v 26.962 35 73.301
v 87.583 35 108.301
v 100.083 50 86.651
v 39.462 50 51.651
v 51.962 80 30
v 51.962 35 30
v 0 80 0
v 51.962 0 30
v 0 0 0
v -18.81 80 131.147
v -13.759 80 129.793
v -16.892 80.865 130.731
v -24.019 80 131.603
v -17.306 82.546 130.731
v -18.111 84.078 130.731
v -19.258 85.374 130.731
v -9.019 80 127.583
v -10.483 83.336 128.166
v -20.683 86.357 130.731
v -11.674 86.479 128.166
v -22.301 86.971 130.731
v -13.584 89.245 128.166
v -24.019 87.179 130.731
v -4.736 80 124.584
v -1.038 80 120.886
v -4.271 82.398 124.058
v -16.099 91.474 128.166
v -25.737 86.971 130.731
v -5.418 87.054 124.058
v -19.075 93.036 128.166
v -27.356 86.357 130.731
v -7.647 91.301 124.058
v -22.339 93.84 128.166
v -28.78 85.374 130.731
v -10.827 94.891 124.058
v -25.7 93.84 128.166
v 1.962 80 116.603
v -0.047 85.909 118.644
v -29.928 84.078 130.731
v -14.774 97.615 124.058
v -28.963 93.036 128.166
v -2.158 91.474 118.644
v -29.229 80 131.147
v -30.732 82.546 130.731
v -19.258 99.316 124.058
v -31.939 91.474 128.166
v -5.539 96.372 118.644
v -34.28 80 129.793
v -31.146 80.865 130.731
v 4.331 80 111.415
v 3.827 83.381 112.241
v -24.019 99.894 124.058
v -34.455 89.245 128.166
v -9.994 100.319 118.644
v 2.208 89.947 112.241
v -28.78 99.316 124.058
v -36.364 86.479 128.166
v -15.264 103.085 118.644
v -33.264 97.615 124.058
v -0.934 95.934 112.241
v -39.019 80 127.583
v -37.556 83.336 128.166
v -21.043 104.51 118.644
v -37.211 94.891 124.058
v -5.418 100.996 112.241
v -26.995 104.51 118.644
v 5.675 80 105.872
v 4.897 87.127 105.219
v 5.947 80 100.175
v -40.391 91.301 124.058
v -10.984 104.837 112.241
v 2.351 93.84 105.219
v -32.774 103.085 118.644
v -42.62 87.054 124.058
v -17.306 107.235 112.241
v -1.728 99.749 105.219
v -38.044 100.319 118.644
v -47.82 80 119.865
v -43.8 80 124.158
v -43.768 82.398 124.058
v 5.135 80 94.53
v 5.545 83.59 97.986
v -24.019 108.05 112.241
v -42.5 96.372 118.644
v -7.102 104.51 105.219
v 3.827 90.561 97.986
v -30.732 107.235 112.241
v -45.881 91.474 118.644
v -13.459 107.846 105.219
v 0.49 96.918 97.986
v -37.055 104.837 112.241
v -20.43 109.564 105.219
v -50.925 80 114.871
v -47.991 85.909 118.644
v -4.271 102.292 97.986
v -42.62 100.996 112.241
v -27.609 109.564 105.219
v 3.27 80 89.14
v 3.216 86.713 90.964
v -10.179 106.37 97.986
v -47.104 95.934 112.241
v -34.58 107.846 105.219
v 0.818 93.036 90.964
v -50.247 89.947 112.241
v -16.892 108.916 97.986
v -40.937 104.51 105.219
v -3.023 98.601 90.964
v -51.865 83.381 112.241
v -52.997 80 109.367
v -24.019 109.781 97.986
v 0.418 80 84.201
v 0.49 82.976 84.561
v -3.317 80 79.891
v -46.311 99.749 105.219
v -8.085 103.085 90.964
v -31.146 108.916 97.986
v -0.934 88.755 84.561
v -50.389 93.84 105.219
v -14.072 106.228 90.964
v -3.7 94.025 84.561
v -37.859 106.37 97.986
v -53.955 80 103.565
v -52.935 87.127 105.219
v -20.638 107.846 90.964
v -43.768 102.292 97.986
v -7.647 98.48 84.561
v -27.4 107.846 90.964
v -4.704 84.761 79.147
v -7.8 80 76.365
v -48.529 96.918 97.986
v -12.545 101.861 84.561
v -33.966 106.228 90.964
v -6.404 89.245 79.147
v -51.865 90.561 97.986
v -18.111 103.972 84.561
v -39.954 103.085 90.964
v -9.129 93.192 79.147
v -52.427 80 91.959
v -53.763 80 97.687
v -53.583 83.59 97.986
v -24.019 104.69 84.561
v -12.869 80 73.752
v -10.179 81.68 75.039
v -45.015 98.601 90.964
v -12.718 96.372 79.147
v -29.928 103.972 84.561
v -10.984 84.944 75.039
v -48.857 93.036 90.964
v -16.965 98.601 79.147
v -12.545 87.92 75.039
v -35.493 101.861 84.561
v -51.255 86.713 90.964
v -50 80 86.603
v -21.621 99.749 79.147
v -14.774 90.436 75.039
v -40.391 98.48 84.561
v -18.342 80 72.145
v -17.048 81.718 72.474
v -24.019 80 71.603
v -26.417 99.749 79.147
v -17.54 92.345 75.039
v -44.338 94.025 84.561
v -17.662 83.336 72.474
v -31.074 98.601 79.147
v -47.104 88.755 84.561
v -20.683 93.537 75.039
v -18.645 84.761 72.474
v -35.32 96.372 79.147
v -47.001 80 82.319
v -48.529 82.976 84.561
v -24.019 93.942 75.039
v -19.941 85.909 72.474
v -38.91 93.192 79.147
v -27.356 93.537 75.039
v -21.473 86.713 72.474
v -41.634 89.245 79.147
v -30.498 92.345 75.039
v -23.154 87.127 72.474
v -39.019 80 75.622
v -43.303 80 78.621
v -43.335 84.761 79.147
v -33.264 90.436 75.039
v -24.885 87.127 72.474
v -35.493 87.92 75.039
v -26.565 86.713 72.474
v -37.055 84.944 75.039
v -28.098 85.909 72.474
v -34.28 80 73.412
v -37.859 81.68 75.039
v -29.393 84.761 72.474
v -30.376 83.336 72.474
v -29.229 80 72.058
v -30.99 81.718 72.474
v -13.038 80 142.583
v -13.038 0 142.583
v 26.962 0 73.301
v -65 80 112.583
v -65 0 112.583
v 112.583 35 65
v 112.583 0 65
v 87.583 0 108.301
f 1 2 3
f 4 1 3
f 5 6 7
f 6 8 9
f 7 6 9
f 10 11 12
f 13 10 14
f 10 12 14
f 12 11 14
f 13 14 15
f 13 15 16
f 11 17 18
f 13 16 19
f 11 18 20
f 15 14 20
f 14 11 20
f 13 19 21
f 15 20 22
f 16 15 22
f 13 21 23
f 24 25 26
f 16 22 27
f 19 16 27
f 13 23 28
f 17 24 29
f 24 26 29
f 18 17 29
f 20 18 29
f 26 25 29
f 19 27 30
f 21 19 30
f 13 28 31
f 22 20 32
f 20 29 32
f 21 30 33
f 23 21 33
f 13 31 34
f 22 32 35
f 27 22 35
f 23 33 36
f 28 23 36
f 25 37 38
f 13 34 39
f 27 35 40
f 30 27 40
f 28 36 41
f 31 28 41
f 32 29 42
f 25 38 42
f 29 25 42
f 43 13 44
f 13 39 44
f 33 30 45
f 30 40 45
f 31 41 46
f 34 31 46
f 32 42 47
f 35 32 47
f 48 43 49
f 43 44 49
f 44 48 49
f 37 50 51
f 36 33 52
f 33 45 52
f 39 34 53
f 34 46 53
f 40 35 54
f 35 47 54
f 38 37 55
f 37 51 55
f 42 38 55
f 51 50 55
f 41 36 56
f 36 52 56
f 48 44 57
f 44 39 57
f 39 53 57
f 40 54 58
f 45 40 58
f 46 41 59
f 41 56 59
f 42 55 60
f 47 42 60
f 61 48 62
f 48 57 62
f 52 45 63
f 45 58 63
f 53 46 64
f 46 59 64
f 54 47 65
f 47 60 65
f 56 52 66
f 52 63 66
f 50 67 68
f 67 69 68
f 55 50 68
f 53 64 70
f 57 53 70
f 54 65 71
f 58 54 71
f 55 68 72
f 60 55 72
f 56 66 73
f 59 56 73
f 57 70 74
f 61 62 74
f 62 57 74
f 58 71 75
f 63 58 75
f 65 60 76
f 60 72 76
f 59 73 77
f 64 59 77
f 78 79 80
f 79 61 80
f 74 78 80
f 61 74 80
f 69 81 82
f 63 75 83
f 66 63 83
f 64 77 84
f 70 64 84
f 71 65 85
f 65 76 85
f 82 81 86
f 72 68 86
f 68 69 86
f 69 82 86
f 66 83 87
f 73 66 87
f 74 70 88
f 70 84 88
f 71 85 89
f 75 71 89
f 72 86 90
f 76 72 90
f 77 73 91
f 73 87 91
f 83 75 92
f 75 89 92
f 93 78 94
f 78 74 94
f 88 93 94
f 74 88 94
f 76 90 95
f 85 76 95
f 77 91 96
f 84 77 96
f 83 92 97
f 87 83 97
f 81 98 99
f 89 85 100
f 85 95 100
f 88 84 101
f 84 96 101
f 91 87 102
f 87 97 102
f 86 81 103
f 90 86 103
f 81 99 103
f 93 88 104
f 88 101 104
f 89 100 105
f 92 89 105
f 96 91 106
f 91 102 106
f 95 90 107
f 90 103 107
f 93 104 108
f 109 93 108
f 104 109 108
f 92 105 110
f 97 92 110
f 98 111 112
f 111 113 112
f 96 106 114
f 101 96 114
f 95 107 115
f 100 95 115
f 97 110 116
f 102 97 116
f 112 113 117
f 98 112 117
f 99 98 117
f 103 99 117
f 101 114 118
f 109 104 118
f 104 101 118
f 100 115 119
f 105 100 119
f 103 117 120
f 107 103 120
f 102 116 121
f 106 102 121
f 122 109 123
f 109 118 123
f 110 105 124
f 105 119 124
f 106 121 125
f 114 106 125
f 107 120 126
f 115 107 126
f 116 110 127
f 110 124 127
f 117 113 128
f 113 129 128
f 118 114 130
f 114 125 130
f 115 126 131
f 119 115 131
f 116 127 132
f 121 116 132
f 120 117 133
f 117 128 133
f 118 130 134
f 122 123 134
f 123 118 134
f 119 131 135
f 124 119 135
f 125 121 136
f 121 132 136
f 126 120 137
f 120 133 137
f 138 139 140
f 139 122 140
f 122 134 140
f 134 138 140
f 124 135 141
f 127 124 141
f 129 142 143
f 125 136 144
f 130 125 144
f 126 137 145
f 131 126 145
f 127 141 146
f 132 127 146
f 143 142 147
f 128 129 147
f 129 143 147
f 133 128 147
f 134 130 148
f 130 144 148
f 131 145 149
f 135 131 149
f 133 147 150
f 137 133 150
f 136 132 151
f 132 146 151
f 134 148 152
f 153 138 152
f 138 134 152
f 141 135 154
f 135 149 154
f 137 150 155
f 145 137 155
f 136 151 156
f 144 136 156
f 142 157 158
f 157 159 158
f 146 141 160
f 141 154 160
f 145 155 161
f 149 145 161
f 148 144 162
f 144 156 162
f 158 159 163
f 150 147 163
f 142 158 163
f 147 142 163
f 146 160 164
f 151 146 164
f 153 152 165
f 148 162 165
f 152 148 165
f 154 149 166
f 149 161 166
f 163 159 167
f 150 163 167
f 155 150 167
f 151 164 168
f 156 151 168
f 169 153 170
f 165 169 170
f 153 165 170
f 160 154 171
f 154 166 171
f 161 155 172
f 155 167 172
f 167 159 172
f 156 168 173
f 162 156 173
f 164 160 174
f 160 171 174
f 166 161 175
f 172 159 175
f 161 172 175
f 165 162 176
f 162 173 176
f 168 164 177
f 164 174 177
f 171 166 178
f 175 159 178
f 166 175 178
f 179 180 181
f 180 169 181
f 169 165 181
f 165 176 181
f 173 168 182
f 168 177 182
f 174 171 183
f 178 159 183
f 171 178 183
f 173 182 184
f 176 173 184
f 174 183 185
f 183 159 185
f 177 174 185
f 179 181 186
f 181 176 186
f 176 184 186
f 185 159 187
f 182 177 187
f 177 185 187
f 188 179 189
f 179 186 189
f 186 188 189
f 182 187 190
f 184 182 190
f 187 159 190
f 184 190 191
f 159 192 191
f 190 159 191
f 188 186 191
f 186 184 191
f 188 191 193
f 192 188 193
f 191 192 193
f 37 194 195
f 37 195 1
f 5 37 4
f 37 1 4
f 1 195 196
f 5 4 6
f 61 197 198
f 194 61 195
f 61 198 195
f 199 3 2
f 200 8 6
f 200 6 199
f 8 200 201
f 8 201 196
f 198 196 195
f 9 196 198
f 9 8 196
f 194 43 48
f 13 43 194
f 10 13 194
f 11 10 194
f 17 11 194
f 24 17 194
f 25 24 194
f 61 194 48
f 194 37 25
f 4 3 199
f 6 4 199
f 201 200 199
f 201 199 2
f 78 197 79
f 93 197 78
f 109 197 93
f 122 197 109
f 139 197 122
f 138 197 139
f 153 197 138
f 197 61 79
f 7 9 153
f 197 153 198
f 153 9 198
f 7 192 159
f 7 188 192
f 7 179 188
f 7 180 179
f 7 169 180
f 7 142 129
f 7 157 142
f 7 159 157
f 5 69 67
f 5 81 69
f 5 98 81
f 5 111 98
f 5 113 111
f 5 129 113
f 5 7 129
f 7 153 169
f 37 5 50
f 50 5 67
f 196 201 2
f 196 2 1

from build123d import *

# Parameters (mm, degrees)
MAIN_BUILDING_DEPTH       = 80
SMALL_BUILDING_DEPTH      = 35
SMALL_BUILDING_ROOF_DEPTH = 70


with BuildPart() as part:
    # Sketch1 → Main Building (new body)
    with BuildSketch(Plane(origin=(0, 0, 0), x_dir=(1, 0, 0), z_dir=(0, 1, 0))):
        Polygon((0, 0), (-65, -112.583302492), (-13.038475773, -142.583302492), (51.961524227, -30), align=None)
    extrude(amount=MAIN_BUILDING_DEPTH)

    # Sketch2 → Dome (revolve)
    with BuildSketch(Plane(origin=(0, 80, 0), x_dir=(-1, 0, 0), z_dir=(0, 1, 0))):
        with BuildLine():
            Line((24.019237886, 71.602540378), (24.019237886, 131.602540378))
            ThreePointArc((24.019237886, 131.602540378), (-5.980762114, 101.602540378), (24.019237886, 71.602540378))
        make_face()
    revolve(axis=Axis((-24.019237886, 80, 71.602540378), (0, 0, 1)))

    # Sketch3 → Small Building (add)
    with BuildSketch(Plane(origin=(0, 0, 0), x_dir=(1, 0, 0), z_dir=(0, 1, 0))):
        Polygon((51.961524227, -30), (112.583302492, -65), (87.583302492, -108.301270189), (26.961524227, -73.301270189), align=None)
    extrude(amount=SMALL_BUILDING_DEPTH)

    # Sketch4 → Small Building Roof (add)
    with BuildSketch(Plane(origin=(112.583302492, 0, 65), x_dir=(0.5, 0, -0.866025404), z_dir=(0.866025404, 0, 0.5))):
        Polygon((0, 35), (-50, 35), (-25, 50), align=None)
    extrude(amount=-SMALL_BUILDING_ROOF_DEPTH)


solid = part.part
